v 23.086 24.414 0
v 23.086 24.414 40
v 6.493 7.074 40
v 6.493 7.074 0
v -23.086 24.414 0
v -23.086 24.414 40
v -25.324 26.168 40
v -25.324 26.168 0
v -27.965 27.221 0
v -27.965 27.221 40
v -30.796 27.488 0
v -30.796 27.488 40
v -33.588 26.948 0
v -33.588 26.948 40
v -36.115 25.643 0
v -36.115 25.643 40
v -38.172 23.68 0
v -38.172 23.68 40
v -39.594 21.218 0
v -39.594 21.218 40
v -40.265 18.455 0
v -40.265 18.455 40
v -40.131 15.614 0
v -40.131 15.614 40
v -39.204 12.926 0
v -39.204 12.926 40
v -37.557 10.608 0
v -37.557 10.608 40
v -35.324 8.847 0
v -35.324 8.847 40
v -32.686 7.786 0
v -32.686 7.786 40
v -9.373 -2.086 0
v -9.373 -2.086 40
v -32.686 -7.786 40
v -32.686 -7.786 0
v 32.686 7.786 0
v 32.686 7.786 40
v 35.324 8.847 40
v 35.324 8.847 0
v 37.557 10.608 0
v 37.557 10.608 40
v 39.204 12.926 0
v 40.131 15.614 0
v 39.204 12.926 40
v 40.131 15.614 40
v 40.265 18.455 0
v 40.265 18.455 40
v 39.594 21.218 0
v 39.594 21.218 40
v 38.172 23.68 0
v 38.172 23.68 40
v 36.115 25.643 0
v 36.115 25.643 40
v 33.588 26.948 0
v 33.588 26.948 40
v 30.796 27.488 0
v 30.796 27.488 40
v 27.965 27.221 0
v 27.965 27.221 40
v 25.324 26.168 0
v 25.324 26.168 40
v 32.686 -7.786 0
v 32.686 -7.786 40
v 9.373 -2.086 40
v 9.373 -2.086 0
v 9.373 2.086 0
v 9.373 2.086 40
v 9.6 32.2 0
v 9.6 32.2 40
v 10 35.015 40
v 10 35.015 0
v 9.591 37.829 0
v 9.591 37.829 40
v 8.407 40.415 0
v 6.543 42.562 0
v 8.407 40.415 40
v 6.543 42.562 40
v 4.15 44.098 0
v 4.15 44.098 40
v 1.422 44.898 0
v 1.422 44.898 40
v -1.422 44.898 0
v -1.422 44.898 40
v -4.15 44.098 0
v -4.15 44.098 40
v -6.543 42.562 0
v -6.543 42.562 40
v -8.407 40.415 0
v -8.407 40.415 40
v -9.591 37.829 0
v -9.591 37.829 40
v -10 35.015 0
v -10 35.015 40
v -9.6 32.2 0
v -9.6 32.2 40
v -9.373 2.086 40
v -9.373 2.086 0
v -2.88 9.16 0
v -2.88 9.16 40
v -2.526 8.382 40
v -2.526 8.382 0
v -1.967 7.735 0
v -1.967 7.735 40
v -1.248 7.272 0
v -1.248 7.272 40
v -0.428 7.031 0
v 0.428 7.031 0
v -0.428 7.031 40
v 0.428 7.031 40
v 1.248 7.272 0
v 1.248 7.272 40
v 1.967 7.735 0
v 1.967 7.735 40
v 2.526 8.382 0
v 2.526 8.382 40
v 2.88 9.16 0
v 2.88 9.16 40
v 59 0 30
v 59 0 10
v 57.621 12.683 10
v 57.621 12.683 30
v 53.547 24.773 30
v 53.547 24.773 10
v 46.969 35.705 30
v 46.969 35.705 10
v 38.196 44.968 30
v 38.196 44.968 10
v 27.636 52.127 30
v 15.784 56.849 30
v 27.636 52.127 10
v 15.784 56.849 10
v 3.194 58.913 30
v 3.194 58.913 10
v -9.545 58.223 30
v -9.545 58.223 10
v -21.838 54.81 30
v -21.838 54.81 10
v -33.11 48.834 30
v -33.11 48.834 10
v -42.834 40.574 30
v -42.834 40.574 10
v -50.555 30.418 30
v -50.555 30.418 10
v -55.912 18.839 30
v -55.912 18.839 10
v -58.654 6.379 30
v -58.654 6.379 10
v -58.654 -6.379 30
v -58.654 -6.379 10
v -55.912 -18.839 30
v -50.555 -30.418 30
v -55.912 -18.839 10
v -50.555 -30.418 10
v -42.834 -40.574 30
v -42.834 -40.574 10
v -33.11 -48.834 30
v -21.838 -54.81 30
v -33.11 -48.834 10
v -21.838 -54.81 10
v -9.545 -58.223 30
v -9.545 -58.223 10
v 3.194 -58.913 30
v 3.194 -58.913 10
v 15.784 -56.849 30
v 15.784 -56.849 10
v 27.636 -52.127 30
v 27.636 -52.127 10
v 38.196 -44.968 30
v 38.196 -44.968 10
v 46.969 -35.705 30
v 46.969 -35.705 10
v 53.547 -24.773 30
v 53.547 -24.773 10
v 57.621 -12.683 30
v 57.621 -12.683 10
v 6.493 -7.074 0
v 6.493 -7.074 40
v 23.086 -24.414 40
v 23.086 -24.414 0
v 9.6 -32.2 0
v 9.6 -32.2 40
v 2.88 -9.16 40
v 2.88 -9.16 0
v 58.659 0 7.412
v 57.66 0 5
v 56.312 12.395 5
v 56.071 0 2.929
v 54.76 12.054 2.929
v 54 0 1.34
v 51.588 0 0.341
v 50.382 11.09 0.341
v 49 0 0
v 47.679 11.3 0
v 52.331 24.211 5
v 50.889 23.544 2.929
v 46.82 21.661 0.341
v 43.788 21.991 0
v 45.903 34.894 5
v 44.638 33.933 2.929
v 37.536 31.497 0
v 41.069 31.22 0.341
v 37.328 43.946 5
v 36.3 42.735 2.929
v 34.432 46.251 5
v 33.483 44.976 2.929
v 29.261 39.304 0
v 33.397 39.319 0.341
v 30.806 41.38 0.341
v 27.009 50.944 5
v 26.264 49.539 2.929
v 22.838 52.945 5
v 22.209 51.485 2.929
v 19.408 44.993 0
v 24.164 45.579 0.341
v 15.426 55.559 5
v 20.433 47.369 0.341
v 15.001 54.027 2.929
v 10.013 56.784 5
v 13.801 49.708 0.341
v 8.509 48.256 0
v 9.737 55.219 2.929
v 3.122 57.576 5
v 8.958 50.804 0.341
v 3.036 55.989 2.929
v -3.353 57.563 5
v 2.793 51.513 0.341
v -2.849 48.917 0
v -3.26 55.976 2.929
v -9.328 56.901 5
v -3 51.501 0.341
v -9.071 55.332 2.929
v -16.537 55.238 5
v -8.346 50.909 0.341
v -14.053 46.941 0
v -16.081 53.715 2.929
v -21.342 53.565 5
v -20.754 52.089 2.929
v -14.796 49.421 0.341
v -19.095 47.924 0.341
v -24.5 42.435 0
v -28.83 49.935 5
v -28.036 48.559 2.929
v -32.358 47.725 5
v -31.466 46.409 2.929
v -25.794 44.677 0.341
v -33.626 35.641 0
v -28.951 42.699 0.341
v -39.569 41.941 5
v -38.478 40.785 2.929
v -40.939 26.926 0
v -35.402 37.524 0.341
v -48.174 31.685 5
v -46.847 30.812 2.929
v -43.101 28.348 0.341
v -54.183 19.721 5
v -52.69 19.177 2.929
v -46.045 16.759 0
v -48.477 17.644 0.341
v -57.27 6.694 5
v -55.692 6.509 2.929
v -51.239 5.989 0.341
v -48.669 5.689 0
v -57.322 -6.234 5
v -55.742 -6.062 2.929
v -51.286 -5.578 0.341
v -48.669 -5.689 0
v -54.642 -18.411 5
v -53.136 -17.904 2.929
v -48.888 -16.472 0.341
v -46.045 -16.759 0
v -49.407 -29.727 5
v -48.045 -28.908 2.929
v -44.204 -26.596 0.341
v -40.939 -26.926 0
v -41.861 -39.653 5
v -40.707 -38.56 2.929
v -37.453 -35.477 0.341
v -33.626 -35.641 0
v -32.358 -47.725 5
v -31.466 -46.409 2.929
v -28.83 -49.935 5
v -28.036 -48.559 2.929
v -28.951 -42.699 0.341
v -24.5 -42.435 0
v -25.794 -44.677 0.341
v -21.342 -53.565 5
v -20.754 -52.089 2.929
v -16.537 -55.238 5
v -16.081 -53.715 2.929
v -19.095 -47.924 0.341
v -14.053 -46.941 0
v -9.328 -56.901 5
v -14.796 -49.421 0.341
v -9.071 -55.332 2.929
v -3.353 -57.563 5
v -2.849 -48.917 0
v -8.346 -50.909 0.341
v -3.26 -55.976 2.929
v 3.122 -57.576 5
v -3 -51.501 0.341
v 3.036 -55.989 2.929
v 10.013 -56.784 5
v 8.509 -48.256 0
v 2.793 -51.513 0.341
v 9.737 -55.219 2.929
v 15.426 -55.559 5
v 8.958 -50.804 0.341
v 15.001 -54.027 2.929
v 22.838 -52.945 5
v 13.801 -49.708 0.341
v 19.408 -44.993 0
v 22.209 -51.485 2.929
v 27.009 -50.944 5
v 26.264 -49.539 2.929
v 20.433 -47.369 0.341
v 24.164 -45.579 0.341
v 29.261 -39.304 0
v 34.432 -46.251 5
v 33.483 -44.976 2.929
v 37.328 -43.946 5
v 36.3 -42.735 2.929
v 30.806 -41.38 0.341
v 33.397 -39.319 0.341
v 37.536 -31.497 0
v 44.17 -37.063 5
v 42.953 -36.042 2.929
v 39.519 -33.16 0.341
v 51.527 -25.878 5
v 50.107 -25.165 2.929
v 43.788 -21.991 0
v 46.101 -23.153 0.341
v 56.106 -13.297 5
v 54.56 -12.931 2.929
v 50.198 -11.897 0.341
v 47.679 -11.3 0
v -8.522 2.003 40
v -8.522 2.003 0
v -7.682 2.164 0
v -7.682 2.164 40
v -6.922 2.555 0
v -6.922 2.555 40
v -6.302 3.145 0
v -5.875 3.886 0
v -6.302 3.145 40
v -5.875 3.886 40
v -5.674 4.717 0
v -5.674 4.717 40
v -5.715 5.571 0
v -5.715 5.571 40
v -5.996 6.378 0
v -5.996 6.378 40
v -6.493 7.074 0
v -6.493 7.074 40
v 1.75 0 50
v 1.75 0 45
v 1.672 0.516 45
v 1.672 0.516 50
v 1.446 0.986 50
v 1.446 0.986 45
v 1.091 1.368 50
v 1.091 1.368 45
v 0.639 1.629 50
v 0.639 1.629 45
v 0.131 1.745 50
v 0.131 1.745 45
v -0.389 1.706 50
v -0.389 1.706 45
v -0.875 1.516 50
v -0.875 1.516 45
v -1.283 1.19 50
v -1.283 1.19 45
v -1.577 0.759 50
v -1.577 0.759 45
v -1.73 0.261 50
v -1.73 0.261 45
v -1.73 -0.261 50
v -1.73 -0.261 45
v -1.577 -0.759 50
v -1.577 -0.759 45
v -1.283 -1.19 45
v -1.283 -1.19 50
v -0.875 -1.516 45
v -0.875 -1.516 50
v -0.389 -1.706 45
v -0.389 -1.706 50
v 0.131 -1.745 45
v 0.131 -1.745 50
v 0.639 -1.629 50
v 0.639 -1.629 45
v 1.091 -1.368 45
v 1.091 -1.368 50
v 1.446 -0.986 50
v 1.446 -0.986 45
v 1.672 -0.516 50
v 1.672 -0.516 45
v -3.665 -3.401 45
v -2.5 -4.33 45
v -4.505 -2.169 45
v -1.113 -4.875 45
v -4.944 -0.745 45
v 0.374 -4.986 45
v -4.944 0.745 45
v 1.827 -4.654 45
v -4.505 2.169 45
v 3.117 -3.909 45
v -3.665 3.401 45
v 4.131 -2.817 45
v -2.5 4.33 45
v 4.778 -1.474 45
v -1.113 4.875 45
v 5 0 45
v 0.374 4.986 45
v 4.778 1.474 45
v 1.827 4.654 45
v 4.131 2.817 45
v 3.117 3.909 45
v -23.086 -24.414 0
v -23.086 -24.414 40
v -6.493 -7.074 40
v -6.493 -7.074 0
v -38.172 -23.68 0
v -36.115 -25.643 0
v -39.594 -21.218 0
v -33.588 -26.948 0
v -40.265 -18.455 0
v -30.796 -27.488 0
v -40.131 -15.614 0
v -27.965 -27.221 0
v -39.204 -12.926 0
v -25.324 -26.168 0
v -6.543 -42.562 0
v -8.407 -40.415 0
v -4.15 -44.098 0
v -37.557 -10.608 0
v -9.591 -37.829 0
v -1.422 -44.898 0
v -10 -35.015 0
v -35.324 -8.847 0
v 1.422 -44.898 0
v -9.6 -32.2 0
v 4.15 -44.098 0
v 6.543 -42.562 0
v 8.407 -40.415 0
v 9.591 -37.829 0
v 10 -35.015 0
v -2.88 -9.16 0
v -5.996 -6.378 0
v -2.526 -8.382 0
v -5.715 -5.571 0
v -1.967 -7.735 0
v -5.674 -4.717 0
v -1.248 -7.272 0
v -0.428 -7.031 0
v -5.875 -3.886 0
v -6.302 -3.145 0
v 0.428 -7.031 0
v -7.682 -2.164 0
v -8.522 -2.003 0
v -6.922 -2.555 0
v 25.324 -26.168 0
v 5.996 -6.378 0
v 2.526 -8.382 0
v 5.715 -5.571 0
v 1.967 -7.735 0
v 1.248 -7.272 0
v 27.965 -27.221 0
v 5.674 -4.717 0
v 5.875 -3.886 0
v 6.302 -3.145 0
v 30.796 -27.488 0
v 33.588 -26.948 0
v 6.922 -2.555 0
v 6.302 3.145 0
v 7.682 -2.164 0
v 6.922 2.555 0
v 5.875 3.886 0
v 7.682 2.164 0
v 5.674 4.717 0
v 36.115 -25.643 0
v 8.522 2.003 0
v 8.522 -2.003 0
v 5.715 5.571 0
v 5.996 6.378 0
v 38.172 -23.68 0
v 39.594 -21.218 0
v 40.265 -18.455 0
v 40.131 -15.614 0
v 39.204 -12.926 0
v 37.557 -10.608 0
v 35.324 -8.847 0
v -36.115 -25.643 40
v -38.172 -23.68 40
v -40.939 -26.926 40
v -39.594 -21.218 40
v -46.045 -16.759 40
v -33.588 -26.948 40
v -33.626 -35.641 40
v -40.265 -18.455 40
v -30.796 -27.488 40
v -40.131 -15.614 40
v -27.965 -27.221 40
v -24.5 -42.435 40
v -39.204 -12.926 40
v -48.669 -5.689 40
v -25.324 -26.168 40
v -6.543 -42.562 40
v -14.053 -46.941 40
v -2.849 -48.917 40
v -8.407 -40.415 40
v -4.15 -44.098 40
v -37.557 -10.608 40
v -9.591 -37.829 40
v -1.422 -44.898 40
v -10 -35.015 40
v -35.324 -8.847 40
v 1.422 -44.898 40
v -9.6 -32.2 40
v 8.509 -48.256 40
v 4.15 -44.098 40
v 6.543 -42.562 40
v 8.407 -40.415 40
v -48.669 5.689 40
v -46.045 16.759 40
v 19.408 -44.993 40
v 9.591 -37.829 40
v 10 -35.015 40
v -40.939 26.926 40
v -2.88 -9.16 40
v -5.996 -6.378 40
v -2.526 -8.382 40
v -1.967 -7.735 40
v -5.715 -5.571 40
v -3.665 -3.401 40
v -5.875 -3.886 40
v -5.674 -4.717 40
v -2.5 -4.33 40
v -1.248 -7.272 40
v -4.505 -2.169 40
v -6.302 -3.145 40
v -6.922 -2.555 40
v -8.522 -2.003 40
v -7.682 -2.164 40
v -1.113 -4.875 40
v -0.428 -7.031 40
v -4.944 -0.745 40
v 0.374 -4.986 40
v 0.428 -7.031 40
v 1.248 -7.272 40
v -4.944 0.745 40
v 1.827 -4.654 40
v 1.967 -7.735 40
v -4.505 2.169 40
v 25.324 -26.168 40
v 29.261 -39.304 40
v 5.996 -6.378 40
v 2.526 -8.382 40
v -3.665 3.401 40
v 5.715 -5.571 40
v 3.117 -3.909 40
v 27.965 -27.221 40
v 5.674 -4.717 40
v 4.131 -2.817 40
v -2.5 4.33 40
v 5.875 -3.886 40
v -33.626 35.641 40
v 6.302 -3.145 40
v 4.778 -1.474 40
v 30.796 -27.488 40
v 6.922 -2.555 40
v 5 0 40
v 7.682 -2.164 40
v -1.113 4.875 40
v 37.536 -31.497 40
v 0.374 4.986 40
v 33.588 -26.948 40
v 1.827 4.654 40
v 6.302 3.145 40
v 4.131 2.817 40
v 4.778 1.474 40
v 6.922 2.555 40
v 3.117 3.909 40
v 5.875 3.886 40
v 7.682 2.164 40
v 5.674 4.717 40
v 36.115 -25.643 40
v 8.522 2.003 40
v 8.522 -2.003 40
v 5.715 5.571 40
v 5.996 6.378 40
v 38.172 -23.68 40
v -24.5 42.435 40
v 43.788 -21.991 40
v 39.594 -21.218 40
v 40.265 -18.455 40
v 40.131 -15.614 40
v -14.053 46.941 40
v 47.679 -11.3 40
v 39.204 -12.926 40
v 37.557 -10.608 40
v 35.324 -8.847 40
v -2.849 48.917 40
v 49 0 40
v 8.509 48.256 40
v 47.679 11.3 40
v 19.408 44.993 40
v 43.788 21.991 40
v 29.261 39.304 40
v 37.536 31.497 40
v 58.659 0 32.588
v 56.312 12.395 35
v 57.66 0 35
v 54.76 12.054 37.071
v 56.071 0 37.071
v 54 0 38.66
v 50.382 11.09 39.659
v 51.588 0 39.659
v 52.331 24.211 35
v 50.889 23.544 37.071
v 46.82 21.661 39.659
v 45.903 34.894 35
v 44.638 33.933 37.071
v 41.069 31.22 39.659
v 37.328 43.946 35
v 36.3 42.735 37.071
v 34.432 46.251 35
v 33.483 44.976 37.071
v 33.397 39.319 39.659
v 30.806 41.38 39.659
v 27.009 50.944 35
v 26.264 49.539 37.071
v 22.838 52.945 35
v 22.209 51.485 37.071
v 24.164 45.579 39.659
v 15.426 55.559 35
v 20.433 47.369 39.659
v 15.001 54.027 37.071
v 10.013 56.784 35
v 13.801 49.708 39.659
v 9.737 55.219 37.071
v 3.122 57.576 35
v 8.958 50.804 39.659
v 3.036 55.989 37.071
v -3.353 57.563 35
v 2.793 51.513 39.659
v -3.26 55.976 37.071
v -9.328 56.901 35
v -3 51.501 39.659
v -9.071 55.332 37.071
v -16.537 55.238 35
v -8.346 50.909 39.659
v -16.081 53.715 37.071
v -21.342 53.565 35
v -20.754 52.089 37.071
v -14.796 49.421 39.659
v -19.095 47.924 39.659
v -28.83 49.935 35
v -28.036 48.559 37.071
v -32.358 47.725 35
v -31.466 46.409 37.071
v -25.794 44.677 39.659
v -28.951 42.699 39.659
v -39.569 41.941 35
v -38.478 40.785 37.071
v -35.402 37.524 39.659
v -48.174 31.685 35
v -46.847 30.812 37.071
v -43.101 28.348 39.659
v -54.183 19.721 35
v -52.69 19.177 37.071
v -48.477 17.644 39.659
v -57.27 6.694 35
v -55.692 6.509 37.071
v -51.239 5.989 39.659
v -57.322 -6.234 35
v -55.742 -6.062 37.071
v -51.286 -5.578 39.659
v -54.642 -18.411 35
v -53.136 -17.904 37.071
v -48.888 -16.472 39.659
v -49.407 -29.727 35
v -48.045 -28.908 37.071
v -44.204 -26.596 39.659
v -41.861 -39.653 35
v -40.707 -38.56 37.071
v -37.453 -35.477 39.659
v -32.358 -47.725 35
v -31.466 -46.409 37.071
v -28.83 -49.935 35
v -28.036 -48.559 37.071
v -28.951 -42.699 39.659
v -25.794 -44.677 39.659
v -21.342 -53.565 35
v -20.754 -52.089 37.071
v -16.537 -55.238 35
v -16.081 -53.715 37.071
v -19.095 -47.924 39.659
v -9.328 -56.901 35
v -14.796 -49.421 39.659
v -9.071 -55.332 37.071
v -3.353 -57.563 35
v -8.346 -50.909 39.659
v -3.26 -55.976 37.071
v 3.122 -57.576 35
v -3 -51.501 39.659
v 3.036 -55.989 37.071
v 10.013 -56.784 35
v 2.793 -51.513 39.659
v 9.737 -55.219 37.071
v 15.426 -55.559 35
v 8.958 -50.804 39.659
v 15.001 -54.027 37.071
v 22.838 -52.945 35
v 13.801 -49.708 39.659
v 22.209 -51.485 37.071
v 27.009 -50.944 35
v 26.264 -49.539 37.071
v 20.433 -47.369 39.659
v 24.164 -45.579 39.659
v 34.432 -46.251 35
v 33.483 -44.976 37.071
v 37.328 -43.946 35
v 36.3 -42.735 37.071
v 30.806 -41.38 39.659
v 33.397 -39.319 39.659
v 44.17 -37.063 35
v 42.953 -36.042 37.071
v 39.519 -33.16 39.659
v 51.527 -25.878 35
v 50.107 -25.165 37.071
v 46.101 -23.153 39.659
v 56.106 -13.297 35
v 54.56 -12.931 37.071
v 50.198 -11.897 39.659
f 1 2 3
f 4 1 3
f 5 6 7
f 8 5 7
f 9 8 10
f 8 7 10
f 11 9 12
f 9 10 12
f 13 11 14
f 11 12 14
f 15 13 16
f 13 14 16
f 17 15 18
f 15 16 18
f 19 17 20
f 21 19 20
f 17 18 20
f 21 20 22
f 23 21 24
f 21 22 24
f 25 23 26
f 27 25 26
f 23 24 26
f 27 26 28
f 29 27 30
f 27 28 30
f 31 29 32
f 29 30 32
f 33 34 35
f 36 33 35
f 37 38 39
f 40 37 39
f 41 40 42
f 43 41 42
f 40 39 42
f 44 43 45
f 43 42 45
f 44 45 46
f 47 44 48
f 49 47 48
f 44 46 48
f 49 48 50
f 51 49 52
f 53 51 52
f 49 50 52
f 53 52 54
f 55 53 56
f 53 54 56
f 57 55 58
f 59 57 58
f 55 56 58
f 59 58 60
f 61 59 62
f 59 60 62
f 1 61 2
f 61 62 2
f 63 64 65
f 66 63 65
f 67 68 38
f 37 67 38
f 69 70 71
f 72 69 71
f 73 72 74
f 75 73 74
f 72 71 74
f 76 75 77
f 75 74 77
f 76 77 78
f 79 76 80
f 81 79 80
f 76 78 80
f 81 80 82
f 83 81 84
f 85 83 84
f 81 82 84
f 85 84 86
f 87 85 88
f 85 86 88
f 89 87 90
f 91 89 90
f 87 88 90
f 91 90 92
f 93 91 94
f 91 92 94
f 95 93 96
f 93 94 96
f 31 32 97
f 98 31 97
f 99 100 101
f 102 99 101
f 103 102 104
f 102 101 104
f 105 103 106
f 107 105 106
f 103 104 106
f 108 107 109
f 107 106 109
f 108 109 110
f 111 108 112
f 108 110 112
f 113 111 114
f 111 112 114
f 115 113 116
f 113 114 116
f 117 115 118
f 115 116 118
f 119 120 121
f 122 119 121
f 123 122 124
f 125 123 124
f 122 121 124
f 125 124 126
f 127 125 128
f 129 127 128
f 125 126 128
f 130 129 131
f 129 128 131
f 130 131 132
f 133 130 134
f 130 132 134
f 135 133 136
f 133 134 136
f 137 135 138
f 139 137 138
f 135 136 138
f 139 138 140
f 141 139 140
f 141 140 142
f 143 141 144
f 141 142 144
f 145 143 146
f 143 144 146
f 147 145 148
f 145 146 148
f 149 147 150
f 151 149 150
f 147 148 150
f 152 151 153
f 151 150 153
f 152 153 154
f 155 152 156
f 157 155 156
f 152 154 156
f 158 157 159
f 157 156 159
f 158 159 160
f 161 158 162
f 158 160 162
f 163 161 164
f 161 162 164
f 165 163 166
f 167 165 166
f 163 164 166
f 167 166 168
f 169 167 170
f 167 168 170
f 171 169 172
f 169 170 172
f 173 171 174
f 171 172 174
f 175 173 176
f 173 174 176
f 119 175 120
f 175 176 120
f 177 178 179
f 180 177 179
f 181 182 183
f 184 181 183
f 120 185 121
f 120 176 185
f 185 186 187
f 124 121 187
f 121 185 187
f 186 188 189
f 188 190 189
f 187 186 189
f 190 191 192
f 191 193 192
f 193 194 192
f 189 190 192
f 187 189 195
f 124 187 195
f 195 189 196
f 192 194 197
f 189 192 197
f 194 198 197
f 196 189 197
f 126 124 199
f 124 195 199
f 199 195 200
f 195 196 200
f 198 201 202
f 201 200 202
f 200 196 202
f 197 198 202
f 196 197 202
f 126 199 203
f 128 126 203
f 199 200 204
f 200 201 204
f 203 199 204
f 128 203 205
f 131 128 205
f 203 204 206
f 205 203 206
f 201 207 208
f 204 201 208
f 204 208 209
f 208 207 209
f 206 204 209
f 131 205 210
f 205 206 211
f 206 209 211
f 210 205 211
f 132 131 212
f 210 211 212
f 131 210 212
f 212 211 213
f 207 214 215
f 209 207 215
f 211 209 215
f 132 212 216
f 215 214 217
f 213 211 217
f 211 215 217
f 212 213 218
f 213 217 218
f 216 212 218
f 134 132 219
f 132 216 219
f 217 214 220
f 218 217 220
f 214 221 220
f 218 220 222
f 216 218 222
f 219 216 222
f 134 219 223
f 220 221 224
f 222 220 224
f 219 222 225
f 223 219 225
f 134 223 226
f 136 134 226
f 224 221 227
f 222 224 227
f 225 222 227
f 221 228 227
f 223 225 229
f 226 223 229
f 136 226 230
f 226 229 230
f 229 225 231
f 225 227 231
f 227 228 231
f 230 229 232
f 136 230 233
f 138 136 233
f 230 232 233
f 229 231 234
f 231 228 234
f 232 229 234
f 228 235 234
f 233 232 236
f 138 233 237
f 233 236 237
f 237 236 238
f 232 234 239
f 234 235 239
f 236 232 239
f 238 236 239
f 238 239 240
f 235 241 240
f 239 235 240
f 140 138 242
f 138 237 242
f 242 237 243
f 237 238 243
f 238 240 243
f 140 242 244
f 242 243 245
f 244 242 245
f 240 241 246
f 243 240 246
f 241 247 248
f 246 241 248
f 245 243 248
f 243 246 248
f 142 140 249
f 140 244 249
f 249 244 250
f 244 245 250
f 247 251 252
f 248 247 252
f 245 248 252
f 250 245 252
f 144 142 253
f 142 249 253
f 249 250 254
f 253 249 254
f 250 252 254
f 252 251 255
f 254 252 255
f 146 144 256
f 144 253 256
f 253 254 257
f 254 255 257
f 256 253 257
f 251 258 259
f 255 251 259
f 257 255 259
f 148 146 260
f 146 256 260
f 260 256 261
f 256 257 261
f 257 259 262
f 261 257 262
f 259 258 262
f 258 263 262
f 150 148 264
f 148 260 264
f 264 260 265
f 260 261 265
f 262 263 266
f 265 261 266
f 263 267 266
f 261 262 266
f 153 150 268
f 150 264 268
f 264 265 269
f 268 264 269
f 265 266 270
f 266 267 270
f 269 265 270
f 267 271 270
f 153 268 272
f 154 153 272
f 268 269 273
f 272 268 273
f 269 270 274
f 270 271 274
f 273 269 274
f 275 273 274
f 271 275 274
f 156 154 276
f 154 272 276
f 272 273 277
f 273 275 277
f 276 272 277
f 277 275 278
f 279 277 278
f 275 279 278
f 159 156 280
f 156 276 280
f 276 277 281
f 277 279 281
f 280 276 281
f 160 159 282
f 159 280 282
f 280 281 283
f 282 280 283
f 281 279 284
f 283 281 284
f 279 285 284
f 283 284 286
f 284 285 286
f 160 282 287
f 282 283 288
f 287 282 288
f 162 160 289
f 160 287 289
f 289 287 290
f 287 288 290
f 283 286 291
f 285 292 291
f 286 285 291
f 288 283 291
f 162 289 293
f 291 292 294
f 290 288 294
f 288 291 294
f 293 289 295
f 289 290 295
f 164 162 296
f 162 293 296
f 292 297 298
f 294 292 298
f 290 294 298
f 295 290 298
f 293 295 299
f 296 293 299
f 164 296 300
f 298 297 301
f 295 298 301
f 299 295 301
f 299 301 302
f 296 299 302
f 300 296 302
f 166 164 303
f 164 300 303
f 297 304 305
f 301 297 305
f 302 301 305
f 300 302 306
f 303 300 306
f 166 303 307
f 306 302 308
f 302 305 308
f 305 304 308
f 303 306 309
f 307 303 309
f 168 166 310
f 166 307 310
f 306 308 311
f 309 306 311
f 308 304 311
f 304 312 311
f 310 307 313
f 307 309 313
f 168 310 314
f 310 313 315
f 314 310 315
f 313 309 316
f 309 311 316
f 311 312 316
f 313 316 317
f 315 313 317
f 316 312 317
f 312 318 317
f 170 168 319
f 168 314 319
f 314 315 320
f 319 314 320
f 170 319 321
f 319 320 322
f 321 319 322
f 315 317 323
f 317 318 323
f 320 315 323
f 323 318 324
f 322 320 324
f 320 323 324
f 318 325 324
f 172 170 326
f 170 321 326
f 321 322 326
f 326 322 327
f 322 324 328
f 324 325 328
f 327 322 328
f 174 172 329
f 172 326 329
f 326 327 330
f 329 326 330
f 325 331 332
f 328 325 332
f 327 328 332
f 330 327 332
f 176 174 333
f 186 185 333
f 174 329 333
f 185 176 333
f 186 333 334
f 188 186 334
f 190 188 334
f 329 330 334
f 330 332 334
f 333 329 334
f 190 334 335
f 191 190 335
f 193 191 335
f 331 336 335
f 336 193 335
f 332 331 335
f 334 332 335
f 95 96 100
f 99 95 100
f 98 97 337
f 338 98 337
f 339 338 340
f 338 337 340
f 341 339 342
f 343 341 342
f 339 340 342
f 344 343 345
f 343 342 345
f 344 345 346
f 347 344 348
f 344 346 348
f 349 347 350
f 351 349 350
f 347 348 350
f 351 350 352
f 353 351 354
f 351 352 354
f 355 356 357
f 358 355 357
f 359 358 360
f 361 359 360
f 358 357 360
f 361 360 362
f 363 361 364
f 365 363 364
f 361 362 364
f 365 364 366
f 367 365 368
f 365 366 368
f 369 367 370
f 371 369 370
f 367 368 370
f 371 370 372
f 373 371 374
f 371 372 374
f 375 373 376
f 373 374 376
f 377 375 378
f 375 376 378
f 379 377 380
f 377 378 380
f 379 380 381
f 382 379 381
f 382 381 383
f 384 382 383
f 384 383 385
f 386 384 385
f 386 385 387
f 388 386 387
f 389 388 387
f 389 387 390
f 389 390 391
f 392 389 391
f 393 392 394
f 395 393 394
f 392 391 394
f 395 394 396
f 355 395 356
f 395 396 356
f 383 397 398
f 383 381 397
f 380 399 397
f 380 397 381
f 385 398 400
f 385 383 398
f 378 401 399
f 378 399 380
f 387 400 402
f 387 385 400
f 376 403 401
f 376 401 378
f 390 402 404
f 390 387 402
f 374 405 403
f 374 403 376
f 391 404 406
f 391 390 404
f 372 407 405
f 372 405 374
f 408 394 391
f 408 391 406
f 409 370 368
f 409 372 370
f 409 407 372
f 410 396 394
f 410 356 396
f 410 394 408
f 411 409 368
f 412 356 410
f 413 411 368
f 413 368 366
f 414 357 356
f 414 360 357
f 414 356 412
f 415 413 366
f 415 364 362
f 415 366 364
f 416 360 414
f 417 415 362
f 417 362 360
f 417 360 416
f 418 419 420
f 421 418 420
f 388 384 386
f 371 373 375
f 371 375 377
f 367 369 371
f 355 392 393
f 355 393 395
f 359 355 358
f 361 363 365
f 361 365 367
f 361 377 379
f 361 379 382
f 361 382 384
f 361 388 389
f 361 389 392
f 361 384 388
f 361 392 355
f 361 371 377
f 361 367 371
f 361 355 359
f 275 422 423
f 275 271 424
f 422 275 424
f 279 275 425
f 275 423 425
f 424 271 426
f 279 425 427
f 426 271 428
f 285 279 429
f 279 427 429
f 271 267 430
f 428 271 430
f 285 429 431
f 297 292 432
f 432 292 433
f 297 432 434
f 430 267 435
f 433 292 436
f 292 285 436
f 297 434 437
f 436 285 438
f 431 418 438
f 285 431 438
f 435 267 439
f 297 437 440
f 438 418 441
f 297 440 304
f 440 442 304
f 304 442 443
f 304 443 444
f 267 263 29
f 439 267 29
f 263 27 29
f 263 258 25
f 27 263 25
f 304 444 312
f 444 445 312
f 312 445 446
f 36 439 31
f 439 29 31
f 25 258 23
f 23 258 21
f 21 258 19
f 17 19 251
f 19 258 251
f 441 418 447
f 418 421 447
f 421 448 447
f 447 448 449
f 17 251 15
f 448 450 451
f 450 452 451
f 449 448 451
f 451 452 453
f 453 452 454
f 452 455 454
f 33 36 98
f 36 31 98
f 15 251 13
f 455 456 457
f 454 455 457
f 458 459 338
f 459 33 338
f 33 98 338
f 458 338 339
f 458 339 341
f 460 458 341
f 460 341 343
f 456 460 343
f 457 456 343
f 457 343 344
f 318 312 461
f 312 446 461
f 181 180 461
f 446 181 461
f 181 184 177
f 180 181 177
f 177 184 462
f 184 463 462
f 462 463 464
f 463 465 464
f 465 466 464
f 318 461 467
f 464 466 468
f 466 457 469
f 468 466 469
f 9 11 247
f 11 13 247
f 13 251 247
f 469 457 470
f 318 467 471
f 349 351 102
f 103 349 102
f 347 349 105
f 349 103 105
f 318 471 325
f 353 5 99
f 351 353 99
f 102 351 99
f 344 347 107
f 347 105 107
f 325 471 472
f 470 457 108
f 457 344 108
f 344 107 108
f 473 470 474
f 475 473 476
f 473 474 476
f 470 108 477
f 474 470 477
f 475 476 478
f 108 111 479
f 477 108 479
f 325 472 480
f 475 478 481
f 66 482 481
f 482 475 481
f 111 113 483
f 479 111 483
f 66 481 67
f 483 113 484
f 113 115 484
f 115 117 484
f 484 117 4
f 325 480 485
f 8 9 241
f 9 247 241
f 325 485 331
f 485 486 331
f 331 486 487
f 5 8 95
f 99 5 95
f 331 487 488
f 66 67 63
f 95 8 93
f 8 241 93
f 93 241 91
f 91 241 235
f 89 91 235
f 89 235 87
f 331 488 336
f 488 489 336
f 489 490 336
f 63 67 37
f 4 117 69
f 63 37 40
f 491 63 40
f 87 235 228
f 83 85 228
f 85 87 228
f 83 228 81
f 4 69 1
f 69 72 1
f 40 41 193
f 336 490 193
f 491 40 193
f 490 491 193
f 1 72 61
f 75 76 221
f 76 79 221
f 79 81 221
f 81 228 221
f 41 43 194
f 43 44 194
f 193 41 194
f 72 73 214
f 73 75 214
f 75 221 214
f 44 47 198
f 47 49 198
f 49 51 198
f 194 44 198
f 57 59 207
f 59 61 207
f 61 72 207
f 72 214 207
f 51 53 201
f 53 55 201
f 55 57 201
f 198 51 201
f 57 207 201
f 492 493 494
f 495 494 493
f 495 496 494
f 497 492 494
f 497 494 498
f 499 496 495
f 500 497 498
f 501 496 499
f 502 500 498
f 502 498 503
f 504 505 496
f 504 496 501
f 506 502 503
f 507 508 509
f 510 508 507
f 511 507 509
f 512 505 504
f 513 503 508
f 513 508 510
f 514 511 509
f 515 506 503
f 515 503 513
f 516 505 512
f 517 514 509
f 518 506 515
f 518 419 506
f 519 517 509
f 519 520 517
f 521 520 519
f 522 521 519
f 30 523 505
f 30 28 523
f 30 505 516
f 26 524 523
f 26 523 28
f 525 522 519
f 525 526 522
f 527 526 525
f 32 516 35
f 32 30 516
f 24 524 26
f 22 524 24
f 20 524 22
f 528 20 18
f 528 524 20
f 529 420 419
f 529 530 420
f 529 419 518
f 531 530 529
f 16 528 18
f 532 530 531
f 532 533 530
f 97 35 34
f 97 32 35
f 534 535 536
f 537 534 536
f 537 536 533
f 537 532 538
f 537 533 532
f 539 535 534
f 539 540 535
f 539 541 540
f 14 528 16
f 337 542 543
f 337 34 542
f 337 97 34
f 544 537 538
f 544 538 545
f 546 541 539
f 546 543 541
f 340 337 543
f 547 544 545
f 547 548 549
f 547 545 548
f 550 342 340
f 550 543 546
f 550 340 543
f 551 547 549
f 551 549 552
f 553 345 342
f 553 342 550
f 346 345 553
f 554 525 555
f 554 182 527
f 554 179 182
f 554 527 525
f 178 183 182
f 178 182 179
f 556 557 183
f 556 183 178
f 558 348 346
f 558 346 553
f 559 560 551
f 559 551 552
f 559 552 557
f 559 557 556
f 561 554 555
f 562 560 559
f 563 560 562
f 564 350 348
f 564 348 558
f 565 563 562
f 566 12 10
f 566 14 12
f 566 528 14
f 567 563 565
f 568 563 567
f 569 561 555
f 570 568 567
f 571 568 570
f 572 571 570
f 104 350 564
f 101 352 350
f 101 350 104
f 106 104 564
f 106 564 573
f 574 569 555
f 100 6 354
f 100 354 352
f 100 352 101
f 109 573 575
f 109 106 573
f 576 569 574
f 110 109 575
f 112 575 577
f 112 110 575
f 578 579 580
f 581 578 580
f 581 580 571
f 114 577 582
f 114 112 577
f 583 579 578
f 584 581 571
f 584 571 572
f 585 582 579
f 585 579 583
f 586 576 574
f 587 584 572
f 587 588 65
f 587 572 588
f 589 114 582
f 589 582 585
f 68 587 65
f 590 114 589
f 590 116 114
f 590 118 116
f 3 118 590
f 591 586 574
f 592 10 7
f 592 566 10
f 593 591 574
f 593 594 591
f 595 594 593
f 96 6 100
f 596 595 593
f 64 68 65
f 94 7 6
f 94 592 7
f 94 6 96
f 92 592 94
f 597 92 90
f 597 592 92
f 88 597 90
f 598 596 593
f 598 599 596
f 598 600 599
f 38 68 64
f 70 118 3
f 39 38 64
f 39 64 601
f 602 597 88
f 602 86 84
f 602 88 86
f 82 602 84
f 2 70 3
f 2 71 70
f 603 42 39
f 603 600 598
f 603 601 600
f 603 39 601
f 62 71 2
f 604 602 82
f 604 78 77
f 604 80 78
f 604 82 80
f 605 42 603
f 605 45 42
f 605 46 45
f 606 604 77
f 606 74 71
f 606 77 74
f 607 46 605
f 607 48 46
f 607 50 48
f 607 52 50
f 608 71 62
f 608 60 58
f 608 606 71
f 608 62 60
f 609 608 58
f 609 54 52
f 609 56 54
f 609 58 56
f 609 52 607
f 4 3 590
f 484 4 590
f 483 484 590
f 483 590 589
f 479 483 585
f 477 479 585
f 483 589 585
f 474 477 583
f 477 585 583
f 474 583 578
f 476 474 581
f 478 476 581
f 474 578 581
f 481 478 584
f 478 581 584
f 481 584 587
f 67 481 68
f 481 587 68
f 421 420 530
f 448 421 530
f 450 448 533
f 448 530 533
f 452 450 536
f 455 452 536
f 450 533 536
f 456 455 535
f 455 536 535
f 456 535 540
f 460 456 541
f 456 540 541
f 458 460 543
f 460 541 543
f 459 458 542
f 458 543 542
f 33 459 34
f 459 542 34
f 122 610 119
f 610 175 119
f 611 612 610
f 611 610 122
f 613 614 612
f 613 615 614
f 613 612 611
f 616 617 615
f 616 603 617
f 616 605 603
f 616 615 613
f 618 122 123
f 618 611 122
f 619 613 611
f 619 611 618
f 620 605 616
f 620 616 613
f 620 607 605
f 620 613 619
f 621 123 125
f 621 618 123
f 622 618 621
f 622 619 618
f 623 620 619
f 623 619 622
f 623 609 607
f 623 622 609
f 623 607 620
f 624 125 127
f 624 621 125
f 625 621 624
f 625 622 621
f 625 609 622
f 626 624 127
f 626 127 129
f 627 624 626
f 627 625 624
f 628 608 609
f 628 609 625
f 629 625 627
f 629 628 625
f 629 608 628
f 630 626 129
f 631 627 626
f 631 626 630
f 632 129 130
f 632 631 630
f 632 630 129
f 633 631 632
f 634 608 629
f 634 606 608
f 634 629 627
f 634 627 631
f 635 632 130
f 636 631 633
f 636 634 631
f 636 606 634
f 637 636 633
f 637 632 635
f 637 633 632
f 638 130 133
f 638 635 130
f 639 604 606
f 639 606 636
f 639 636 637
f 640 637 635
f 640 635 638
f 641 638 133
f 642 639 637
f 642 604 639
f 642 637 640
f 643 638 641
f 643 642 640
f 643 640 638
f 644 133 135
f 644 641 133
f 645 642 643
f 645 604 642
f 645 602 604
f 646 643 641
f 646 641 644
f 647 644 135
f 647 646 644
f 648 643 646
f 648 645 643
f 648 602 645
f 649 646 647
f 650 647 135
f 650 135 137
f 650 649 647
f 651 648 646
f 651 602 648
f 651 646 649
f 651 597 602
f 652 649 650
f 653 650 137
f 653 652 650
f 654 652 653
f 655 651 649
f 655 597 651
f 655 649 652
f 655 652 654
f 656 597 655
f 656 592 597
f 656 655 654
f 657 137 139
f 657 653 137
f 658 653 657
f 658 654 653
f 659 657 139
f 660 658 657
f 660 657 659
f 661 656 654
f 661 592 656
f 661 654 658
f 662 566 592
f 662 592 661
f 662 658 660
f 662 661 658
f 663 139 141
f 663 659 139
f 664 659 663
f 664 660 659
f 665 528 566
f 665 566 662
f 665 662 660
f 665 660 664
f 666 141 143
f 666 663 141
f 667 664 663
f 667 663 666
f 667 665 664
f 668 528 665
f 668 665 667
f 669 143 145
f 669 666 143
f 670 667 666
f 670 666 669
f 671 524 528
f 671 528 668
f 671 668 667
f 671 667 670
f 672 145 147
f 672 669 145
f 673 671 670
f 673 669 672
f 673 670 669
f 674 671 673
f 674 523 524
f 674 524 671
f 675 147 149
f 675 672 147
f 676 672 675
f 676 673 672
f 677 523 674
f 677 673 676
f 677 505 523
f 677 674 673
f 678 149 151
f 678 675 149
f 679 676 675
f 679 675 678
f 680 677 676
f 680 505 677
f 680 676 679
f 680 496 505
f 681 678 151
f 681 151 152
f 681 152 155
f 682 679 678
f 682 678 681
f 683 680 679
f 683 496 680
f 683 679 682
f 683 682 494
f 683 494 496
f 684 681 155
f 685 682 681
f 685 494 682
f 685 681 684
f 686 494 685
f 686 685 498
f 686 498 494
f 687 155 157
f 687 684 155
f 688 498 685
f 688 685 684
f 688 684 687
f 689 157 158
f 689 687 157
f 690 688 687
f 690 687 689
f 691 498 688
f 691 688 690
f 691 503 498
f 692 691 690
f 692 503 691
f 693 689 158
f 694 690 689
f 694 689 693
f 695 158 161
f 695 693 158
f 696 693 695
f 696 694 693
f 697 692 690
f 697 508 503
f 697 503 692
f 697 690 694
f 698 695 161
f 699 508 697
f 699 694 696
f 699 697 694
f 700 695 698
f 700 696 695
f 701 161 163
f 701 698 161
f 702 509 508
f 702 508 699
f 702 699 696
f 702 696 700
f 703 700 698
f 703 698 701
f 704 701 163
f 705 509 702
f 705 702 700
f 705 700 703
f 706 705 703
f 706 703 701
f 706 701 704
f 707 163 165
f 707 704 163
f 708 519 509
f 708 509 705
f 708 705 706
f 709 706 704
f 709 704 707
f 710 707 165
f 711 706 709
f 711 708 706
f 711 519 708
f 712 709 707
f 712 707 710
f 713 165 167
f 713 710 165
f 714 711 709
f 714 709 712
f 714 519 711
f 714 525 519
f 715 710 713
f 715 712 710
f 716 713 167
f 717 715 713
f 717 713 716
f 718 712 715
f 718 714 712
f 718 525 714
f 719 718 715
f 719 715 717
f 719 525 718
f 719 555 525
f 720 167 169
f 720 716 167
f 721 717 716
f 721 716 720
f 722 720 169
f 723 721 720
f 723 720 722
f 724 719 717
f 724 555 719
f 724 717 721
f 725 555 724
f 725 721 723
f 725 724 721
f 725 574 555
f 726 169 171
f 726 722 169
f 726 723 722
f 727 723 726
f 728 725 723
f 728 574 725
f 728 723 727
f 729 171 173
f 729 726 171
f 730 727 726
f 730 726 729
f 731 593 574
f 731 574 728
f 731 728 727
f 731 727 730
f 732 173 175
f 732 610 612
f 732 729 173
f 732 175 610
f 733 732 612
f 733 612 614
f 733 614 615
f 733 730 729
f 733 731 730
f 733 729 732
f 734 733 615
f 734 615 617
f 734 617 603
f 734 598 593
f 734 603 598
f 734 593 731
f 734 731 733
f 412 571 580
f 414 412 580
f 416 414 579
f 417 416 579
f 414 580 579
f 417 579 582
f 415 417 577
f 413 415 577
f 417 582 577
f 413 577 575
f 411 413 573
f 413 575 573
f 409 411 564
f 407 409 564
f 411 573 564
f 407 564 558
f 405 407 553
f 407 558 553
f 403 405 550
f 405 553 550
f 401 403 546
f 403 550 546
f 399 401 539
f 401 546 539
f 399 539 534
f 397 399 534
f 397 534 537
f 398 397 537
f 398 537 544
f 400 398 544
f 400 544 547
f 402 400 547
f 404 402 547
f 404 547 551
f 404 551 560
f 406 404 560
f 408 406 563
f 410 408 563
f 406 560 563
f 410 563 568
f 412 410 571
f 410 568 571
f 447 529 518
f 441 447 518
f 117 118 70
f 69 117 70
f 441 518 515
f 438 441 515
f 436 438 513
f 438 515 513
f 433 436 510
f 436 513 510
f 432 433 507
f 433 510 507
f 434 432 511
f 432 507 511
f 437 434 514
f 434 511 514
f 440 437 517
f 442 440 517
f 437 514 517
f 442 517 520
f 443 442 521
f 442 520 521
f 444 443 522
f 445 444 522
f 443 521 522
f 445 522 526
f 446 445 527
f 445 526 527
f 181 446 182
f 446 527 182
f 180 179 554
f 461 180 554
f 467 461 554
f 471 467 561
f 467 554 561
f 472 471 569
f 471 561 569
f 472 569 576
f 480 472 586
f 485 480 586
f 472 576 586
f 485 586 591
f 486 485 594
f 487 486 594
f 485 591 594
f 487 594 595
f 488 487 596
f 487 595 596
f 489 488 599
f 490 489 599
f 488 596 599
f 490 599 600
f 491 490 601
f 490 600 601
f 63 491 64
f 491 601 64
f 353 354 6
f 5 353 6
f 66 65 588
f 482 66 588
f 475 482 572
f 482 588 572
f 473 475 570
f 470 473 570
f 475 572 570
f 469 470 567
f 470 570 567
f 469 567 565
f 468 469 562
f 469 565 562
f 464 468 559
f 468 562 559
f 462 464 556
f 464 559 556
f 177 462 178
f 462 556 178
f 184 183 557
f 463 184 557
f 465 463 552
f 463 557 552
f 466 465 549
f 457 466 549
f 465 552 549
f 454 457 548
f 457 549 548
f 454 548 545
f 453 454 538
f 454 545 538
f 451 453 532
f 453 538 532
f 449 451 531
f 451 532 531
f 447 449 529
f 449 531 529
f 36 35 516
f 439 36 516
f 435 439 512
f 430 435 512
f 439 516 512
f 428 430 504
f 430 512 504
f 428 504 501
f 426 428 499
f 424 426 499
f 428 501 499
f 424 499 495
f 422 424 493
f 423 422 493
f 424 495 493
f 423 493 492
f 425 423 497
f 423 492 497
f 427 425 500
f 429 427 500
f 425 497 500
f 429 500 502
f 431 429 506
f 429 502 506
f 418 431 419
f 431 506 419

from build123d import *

# Parameters (mm, degrees)
SKETCH_1_R               = 59
EXTRUDE_1_DEPTH          = 40
FILLET_1_R               = 10
SKETCH_2_R               = 5
EXTRUDE_2_DEPTH          = 5
SKETCH_3_R               = 1.75
EXTRUDE_3_DEPTH          = 5
CUT_EXTRUDE_1_DEPTH      = 93.531075925
PATTERN_CIRCULAR_1_COUNT = 6


with BuildPart() as part:
    # 草图1 → 凸台-拉伸1 (new body)
    with BuildSketch(Plane.XY):
        Circle(SKETCH_1_R)
    extrude(amount=EXTRUDE_1_DEPTH)

    # 圆角1
    fillet_1_edges = [part.edges().sort_by_distance(p)[0] for p in [
        (-59, 0, 0),
        (-59, 0, 40),
    ]]
    fillet(fillet_1_edges, radius=FILLET_1_R)

    # 草图2 → 凸台-拉伸2 (add)
    with BuildSketch(Plane.XY.offset(40)):
        Circle(SKETCH_2_R)
    extrude(amount=EXTRUDE_2_DEPTH)

    # 草图3 → 凸台-拉伸3 (add)
    with BuildSketch(Plane.XY.offset(45)):
        Circle(SKETCH_3_R)
    extrude(amount=EXTRUDE_3_DEPTH)

    # 草图4 → 切除-拉伸1 (cut, through all)
    with BuildSketch(Plane.XY.offset(40)):
        with BuildLine():
            Line((-9.6, 32.2), (-2.88, 9.16))
            ThreePointArc((-2.88, 9.16), (0, 7), (2.88, 9.16))
            Line((2.88, 9.16), (9.6, 32.2))
            ThreePointArc((9.6, 32.2), (0, 45), (-9.6, 32.2))
        make_face()
    cut_extrude_1 = extrude(amount=-CUT_EXTRUDE_1_DEPTH, mode=Mode.SUBTRACT)

    # 阵列(圆周)1: 切除-拉伸1 ×6 about axis
    pattern_circular_1_axis = Axis((0, 0, 0), (0, 0, 1))
    for i in range(1, PATTERN_CIRCULAR_1_COUNT):
        add(cut_extrude_1.rotate(pattern_circular_1_axis, i * 360 / PATTERN_CIRCULAR_1_COUNT), mode=Mode.SUBTRACT)


solid = part.part
